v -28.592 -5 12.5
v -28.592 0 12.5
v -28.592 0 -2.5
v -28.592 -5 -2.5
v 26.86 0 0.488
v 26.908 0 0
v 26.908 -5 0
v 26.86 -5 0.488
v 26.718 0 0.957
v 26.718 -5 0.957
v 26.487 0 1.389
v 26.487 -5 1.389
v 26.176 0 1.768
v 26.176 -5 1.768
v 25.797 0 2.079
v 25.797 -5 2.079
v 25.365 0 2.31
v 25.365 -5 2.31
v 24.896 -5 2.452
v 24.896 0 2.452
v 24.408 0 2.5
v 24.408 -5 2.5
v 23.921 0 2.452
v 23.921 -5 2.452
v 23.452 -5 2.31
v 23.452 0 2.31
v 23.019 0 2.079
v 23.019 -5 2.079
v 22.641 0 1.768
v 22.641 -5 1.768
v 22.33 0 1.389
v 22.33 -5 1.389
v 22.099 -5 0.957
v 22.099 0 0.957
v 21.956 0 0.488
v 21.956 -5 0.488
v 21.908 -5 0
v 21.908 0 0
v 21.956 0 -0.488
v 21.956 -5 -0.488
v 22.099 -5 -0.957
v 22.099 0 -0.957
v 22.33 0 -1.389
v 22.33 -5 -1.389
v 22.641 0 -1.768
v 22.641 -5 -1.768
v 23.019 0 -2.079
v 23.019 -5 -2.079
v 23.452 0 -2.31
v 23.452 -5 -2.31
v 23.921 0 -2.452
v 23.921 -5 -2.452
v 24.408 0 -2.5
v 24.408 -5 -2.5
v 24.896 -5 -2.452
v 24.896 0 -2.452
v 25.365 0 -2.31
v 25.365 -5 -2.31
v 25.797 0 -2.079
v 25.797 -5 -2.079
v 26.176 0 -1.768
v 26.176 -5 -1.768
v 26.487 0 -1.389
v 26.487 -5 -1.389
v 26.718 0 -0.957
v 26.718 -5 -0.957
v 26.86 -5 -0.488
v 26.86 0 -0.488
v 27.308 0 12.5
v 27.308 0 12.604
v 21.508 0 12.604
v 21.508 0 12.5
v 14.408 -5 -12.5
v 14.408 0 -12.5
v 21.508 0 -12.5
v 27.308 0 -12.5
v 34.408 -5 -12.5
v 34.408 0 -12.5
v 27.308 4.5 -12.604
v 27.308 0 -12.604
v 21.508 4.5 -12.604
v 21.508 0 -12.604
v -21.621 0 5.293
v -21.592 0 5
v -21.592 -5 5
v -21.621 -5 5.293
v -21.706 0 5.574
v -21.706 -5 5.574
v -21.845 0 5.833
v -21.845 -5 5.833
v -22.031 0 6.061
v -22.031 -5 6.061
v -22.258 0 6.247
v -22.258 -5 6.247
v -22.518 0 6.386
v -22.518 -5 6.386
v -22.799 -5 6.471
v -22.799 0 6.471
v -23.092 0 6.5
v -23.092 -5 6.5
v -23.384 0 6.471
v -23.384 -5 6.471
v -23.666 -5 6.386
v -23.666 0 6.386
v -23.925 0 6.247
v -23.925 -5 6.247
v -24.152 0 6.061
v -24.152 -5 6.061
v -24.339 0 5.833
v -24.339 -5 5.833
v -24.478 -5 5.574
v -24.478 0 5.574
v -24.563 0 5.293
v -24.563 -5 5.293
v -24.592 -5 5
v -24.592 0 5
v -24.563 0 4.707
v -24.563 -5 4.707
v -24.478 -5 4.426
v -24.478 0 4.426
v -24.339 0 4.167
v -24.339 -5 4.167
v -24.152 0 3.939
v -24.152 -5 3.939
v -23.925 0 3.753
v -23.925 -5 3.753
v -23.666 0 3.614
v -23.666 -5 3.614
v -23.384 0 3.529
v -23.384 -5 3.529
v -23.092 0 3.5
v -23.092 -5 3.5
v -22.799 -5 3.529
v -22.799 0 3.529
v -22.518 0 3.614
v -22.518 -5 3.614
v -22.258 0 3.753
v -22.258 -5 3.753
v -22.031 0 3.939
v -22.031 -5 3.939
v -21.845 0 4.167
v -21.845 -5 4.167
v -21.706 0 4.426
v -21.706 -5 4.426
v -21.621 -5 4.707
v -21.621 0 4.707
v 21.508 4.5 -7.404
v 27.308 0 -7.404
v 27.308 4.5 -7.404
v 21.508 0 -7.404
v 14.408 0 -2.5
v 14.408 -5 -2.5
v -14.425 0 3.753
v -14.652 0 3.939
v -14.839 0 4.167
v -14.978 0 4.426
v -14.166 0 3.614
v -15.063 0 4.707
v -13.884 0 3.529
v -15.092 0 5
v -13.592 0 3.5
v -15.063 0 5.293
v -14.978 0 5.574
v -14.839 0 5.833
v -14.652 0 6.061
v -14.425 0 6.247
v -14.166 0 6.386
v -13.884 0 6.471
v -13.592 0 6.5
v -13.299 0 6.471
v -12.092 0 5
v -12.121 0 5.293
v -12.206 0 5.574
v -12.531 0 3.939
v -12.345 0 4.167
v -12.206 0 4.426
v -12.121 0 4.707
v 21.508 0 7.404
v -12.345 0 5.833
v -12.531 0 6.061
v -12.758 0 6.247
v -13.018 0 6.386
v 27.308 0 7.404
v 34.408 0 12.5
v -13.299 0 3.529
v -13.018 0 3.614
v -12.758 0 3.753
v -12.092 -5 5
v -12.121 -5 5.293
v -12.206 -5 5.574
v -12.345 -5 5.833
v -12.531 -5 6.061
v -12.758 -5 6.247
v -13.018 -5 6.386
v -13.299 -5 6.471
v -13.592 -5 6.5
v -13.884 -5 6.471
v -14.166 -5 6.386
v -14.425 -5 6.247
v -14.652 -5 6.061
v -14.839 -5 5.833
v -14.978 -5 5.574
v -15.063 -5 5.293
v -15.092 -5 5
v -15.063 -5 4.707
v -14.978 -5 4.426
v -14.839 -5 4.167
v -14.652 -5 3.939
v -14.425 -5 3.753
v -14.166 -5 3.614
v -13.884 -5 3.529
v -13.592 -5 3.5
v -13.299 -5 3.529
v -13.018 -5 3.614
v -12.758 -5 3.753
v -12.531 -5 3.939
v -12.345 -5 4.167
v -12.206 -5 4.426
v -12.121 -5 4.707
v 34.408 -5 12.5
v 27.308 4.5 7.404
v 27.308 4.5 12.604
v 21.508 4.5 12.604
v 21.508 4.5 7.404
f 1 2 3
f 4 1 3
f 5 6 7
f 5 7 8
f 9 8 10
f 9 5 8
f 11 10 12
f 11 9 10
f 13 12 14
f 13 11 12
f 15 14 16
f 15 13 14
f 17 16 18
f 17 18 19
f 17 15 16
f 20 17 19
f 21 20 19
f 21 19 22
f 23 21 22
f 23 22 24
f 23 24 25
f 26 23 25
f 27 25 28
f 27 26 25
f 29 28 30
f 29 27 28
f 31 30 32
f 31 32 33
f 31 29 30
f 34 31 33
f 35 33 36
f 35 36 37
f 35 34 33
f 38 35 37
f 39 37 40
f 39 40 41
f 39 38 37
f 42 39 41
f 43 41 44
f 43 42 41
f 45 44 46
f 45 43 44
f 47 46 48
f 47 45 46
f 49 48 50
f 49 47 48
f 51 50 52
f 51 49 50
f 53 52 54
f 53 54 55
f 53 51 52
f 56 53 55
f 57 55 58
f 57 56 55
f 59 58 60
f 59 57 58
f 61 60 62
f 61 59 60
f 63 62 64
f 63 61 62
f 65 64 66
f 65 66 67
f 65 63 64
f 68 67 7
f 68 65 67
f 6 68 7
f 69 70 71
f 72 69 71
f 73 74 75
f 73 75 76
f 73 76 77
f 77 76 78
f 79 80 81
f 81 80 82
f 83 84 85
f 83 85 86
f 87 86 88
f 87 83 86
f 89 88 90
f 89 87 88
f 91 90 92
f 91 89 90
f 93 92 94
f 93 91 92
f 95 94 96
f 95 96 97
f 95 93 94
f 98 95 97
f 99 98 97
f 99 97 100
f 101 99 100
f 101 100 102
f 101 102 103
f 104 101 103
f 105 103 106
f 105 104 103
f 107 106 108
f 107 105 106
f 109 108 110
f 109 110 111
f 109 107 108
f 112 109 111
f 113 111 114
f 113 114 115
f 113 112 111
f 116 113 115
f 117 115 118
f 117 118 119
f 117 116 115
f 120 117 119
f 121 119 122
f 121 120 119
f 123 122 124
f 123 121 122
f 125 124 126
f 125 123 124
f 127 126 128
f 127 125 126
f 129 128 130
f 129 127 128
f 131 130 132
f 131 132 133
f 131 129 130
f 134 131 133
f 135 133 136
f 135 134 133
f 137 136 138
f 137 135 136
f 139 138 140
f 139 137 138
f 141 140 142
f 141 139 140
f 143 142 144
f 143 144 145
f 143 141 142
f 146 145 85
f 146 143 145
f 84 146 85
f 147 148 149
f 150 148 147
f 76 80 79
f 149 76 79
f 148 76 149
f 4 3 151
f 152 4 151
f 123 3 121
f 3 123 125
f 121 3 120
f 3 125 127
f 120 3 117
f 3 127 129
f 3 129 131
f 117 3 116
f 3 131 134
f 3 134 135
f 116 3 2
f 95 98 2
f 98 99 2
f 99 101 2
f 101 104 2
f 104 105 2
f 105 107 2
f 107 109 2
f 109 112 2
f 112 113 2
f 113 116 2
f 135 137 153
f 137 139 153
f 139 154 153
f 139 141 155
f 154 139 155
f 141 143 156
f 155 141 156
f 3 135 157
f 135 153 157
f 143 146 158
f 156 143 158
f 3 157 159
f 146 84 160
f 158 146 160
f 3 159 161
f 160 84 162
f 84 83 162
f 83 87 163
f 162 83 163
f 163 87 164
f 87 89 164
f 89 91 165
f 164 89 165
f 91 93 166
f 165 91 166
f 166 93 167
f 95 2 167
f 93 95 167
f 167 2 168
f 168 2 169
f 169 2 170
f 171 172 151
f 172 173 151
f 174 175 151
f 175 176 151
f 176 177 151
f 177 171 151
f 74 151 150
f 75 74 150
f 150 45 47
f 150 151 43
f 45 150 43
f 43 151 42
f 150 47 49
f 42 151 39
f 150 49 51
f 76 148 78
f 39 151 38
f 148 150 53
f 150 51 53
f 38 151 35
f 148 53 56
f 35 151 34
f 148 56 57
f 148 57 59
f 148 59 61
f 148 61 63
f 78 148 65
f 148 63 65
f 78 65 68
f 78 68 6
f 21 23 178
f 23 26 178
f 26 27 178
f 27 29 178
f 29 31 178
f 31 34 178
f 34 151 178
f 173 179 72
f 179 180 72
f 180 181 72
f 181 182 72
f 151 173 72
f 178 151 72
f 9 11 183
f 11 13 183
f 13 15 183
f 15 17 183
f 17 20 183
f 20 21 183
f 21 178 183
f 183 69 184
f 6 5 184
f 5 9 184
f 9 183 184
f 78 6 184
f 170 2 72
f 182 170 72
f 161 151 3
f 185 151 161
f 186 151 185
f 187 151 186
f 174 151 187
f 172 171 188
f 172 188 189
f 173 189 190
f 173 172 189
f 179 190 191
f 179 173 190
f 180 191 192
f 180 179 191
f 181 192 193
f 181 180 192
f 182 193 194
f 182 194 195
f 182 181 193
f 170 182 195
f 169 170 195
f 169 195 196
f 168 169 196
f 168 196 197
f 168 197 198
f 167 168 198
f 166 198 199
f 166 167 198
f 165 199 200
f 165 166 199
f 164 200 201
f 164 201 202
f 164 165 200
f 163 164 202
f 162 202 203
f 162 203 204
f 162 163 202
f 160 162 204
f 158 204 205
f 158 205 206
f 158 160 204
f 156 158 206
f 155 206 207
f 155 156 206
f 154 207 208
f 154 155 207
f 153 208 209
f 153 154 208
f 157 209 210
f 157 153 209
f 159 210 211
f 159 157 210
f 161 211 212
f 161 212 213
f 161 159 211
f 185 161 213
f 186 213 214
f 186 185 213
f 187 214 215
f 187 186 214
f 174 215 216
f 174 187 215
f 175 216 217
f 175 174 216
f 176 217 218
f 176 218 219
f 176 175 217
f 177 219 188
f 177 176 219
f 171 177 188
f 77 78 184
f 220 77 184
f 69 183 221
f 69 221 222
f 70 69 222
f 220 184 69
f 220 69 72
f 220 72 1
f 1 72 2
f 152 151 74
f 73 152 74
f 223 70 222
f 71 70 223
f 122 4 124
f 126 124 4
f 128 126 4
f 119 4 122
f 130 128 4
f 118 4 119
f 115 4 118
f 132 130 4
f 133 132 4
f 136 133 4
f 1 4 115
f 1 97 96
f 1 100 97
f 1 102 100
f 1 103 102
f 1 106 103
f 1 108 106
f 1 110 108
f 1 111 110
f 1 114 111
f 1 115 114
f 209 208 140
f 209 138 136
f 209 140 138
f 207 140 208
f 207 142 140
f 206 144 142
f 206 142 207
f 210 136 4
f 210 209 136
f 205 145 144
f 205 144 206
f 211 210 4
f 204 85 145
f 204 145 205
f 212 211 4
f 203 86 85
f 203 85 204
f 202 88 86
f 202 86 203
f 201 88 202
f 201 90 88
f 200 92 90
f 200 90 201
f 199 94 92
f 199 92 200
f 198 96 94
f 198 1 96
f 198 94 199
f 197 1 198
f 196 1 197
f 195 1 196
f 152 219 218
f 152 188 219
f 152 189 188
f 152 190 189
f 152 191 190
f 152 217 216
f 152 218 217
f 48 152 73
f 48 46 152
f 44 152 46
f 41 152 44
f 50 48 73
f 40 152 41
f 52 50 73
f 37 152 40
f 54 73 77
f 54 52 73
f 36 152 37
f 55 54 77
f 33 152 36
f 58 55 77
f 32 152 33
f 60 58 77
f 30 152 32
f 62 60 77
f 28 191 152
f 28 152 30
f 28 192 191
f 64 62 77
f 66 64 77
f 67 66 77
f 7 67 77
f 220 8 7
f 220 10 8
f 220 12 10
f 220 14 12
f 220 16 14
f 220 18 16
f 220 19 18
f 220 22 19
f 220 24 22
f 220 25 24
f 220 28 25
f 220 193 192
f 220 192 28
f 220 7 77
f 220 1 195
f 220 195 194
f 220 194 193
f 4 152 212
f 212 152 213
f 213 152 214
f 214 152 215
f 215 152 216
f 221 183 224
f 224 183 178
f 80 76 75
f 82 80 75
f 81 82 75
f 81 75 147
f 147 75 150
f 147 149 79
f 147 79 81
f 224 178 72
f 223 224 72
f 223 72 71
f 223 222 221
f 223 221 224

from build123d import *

# Parameters (mm, degrees)
F0_R     = 1.5
F0_R_2   = 2.5
F1_DEPTH = 5
F3_W     = 5.8
F3_H     = 5.2
F4_DEPTH = 4.5


with BuildPart() as f1:
    # F0 (on Front) → F1 (new body)
    with BuildSketch(Plane.XZ):
        Polygon((34.4082845706, -12.5), (34.4082845706, 12.5), (14.4082845706, 12.5), (-28.5917154294, 12.5), (-28.5917154294, -2.5), (14.4082845706, -2.5), (14.4082845706, -12.5), align=None)
        with Locations((-23.0917154294, 5)):
            Circle(F0_R, mode=Mode.SUBTRACT)
        with Locations((-13.5917154294, 5)):
            Circle(F0_R, mode=Mode.SUBTRACT)
        with Locations((24.4082845706, 0)):
            Circle(F0_R_2, mode=Mode.SUBTRACT)
    extrude(amount=F1_DEPTH)

    # F3 (on offset) → F4 (join)
    with BuildSketch(Plane(origin=(0, 0, 0), x_dir=(-1, 0, 0), z_dir=(0, 1, 0))):
        with Locations((-24.4082845706, 10.0041090116)):
            Rectangle(F3_W, F3_H)
        with Locations((-24.4082845706, -10.0041090116)):
            Rectangle(F3_W, F3_H)
    extrude(amount=F4_DEPTH)


solid = f1.part
